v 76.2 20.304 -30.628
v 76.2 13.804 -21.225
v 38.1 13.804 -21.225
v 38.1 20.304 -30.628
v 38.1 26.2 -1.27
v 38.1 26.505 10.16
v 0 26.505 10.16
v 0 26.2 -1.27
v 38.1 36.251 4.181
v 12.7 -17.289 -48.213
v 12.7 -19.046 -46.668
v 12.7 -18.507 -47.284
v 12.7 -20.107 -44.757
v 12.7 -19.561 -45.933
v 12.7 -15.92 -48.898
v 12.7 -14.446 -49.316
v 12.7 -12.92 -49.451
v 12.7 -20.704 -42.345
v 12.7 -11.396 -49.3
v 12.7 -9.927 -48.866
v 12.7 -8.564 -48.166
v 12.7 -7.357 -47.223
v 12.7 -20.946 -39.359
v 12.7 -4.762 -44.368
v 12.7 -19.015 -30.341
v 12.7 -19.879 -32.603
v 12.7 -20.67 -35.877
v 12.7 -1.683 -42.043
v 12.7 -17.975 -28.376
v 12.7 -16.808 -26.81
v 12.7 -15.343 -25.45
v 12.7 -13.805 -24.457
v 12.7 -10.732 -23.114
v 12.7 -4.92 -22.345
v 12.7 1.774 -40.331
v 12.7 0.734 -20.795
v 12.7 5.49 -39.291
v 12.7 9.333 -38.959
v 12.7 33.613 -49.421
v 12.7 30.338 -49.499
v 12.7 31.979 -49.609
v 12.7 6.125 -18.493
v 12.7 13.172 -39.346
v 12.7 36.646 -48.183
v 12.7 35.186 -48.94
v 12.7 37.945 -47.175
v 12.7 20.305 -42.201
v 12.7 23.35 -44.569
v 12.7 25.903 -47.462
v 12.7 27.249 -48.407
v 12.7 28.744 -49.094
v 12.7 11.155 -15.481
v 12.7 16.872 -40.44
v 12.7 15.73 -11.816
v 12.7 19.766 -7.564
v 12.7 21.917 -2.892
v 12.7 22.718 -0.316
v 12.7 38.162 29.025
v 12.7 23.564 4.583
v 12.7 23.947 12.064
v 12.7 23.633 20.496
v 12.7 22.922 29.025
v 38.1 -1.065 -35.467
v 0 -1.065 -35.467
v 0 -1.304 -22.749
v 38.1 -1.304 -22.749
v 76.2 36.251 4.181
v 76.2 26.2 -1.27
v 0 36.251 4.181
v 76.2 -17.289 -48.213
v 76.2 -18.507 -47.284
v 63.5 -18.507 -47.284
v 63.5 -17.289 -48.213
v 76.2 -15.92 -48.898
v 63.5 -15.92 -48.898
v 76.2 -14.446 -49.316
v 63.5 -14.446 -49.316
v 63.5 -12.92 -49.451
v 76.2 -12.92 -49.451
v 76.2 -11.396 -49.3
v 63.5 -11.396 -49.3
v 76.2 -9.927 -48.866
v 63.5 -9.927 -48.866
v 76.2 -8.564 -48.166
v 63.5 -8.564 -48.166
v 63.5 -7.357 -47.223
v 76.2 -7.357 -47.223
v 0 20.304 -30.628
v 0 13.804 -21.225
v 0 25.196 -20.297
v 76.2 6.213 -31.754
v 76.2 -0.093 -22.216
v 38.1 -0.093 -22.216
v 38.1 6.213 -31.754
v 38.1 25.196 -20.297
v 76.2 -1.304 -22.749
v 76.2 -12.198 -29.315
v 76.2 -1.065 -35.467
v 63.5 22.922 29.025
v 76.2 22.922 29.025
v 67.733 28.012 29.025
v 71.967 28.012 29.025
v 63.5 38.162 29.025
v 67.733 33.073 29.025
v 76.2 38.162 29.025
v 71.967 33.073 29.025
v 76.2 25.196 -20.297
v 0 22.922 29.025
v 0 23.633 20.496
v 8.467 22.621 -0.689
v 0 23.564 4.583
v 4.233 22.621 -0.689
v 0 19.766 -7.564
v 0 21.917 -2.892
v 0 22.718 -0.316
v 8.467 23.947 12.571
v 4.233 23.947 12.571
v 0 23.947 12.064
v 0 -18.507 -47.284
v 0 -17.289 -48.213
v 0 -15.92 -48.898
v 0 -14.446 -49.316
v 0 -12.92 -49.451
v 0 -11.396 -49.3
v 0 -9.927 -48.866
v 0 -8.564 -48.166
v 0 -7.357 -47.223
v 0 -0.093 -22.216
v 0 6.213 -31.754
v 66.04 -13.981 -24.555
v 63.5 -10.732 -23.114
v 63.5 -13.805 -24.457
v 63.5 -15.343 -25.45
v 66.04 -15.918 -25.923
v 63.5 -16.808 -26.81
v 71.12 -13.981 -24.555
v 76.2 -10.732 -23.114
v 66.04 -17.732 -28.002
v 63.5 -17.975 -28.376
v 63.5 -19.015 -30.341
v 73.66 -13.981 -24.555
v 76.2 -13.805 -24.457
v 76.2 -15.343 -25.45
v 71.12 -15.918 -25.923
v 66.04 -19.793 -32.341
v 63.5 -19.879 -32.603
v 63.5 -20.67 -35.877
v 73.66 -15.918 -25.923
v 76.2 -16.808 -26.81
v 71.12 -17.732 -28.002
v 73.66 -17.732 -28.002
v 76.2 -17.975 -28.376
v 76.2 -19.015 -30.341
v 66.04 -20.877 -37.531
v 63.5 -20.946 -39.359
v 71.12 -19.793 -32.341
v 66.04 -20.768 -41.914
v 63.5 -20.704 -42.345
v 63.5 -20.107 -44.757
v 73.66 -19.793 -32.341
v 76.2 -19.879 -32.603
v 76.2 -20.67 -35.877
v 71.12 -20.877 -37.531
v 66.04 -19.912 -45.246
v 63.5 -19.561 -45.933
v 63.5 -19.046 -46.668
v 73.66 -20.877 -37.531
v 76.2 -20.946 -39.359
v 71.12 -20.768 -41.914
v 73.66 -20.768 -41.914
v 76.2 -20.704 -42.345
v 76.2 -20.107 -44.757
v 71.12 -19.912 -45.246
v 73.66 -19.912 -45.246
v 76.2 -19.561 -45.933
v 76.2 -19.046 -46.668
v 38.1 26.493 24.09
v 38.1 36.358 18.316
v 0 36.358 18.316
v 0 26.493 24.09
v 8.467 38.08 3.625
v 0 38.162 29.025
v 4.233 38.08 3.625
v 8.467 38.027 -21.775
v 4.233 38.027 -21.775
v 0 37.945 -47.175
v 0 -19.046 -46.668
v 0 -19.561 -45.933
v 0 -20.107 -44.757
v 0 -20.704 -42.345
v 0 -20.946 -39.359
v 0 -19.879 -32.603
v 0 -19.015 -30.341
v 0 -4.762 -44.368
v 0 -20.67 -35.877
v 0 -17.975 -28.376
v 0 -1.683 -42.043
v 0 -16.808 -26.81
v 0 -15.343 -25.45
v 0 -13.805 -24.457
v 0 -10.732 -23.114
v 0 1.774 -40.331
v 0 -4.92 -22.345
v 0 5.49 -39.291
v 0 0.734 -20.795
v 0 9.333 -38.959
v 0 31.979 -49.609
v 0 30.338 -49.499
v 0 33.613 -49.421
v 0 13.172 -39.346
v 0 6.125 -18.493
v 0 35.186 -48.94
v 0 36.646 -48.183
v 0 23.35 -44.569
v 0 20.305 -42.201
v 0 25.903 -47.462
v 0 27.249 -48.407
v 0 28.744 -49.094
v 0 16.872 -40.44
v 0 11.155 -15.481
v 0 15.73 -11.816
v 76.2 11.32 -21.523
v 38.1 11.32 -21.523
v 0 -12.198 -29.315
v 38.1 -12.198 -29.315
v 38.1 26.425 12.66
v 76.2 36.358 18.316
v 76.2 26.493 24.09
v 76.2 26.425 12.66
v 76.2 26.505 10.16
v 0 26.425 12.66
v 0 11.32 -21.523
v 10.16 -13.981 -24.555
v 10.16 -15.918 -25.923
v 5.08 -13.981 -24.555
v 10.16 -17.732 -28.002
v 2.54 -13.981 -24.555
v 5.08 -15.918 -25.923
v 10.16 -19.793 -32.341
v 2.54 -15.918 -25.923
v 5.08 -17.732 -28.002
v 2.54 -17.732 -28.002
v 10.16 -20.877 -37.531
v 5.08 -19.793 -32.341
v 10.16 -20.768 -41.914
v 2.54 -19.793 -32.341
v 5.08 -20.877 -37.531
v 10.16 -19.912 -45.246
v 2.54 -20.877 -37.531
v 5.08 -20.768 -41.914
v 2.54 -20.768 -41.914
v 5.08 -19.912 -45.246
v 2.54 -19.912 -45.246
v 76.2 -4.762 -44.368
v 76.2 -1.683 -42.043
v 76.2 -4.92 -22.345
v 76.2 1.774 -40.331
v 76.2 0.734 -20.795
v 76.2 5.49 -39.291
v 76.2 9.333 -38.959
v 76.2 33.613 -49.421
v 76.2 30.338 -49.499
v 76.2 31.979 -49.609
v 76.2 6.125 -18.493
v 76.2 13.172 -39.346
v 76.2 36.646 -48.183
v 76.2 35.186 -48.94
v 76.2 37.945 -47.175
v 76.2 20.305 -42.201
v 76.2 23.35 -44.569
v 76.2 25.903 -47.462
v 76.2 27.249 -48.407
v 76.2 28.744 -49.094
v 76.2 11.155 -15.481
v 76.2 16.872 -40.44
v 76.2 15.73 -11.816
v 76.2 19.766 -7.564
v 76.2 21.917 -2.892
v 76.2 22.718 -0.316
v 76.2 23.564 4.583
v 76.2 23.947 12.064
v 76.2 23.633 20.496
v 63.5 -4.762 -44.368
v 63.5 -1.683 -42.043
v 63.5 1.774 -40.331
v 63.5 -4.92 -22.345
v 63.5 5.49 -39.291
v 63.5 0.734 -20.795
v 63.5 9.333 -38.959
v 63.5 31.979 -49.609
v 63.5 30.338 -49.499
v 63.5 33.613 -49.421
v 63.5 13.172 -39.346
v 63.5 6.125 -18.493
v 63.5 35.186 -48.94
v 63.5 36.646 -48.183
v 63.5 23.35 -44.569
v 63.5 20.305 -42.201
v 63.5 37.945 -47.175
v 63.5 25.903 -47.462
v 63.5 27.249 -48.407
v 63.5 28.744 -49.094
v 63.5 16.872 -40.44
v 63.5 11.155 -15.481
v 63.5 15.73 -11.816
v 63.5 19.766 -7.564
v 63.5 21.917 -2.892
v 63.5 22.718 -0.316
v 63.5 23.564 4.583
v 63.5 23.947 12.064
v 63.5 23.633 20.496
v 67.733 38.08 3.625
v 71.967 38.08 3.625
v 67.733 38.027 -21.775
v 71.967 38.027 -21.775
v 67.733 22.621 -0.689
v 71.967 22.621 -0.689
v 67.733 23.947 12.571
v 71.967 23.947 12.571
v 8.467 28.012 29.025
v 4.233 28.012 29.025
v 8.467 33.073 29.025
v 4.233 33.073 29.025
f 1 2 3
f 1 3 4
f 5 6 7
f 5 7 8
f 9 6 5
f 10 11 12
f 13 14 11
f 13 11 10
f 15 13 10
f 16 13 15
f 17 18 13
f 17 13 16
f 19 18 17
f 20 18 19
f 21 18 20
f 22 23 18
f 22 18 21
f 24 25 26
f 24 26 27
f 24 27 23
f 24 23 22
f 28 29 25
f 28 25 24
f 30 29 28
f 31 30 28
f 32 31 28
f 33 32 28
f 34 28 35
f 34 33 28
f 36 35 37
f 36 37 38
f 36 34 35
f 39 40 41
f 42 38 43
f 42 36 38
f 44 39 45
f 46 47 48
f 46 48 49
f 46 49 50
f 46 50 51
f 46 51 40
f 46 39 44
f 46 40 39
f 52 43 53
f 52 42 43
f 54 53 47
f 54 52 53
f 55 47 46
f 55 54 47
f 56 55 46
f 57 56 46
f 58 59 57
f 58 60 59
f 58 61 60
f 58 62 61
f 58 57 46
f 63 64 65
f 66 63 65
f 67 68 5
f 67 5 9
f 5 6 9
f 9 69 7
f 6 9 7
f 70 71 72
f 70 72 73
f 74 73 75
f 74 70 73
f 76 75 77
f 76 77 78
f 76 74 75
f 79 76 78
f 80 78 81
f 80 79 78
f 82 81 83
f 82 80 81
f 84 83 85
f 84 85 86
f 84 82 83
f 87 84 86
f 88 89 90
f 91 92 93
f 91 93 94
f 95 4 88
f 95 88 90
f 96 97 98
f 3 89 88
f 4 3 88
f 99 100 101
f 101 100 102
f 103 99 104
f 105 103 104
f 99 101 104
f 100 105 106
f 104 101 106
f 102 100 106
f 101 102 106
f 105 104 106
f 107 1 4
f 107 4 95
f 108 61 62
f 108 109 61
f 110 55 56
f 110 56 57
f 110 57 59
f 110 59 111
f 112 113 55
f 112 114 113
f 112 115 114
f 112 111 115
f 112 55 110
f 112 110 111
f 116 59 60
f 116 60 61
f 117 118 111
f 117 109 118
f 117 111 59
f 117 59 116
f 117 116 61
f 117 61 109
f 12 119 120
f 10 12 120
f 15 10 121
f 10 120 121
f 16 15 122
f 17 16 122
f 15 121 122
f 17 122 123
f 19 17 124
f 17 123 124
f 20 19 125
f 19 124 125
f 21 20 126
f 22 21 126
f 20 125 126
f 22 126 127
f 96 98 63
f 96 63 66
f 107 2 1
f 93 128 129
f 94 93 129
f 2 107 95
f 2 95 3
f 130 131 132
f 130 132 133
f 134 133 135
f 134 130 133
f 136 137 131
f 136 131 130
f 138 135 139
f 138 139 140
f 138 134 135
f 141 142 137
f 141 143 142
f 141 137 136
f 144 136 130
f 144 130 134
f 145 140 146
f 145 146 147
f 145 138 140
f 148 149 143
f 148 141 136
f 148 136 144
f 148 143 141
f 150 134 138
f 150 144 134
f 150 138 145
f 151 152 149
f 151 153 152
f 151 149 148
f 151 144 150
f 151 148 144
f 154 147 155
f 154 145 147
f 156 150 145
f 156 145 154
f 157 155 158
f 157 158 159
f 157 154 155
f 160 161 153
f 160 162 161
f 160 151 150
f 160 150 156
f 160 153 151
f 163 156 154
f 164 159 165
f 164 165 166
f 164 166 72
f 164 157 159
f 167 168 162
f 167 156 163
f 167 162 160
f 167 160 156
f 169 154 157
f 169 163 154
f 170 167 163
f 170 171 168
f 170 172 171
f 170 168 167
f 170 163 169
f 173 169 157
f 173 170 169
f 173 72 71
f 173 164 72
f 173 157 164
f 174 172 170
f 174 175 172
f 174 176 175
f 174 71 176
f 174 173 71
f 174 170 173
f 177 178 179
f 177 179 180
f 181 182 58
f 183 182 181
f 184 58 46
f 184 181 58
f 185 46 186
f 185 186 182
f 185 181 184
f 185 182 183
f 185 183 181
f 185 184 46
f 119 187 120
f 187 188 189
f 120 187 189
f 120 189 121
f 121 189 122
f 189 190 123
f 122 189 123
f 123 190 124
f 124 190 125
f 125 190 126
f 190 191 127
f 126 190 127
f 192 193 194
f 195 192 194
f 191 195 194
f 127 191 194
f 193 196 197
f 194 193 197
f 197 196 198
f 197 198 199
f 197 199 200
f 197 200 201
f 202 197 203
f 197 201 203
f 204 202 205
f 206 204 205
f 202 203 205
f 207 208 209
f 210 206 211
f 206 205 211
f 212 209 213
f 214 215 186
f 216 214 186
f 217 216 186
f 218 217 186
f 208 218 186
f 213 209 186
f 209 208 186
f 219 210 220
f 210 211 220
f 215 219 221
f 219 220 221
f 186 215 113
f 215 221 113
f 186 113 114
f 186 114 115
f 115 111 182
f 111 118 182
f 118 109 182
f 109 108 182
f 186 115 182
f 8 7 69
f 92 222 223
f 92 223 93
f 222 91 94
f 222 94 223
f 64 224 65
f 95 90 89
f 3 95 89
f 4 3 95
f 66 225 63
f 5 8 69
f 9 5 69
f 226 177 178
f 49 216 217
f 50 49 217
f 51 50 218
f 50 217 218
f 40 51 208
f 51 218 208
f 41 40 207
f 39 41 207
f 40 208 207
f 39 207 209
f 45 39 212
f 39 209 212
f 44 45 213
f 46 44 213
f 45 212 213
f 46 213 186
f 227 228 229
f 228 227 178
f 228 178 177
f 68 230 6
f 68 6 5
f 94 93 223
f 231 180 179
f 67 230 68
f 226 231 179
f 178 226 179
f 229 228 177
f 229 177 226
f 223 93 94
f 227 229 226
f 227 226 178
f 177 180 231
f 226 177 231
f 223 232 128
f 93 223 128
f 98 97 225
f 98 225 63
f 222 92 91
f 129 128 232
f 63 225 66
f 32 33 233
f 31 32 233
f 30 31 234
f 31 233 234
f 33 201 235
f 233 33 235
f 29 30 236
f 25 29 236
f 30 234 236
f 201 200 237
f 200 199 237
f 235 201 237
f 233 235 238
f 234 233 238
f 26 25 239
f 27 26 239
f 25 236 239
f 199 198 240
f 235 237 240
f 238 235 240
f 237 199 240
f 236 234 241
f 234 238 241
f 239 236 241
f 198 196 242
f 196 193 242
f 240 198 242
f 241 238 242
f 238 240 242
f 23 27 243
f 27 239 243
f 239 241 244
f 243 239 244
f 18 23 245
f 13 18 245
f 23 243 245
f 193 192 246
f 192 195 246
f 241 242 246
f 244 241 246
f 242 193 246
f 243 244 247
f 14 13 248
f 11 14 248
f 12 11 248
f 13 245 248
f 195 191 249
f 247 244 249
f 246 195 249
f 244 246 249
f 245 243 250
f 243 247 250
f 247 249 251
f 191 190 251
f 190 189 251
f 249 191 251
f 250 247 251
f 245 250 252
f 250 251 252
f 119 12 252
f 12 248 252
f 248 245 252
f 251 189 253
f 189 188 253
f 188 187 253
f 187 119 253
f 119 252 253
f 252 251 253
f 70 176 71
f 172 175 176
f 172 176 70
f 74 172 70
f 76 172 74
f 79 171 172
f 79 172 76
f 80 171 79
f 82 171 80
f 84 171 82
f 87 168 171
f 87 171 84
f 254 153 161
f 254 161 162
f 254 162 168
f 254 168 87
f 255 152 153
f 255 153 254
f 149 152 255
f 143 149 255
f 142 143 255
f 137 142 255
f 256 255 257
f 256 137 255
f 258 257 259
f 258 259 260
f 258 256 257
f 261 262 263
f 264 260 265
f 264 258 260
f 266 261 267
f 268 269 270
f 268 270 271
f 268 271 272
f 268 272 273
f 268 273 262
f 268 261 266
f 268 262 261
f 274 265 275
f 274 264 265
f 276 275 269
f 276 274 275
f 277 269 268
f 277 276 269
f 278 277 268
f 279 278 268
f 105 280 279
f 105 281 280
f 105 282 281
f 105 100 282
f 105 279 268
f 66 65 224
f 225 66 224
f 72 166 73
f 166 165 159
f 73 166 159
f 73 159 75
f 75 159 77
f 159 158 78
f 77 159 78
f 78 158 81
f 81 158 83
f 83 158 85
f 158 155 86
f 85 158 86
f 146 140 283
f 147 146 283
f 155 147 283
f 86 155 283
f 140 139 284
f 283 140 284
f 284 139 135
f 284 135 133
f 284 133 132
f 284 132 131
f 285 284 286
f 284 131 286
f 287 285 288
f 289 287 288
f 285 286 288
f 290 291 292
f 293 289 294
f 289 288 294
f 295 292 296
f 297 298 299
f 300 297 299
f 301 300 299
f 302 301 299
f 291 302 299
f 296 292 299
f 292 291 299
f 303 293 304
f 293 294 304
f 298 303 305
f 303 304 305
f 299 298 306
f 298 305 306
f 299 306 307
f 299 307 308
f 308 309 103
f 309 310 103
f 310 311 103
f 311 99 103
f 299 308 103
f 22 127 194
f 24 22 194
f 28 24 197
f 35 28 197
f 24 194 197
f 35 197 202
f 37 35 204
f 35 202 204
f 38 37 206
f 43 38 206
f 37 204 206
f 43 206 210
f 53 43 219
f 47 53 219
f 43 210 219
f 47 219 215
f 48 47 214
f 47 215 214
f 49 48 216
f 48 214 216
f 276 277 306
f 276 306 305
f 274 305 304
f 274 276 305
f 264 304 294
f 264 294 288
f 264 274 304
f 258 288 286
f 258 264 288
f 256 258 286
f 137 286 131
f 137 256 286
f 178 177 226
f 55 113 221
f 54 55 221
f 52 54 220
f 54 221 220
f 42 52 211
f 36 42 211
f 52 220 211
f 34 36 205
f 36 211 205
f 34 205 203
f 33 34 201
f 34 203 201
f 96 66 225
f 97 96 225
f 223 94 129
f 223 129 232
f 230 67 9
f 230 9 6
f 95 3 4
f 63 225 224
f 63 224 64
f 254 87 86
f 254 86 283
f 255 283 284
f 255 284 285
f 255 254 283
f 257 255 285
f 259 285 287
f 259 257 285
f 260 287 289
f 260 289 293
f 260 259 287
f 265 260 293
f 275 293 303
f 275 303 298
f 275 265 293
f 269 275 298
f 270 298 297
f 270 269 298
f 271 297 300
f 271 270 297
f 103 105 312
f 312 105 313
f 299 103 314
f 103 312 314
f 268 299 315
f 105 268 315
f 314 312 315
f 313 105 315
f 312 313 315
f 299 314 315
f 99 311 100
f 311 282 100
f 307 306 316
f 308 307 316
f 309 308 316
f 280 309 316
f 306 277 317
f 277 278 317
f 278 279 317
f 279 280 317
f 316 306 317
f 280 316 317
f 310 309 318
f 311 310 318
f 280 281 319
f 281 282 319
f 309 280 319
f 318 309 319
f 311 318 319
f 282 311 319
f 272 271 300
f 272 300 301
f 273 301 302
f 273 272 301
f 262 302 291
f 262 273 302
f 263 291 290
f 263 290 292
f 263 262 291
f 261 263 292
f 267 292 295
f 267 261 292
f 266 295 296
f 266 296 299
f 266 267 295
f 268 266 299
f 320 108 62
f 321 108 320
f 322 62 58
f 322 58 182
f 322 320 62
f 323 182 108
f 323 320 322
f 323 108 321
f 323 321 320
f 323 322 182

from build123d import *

# Parameters (mm, degrees)
F3_DEPTH = 38.1
F4_DEPTH = 12.7


with BuildPart() as f3:
    # F1 (on face) → F3 (new body)
    with BuildSketch(Plane.YZ):
        Polygon((26.4932508283, 24.0903730023), (26.4247749001, 12.6603730023), (36.3576832294, 18.3160711089), align=None)
    extrude(amount=F3_DEPTH)


with BuildPart() as f3b:
    # F1 (on face) → F3, piece 2 (new body)
    with BuildSketch(Plane.YZ):
        Polygon((36.2513714214, 4.1811371174), (26.5050424251, 10.1600001085), (26.2003596872, -1.2699998915), align=None)
    extrude(amount=F3_DEPTH)


with BuildPart() as f3c:
    # F2 (on face) → F3, piece 3 (new body)
    with BuildSketch(Plane.YZ):
        Polygon((25.1961359321, -20.2973962285), (13.8036624626, -21.2253710115), (20.3035489335, -30.6275550566), align=None)
    extrude(amount=F3_DEPTH)


with BuildPart() as f3d:
    # F2 (on face) → F3, piece 4 (new body)
    with BuildSketch(Plane.YZ):
        Polygon((6.2131369486, -31.7535884678), (11.3198000183, -21.5232549511), (-0.0932602313, -22.2159217626), align=None)
    extrude(amount=F3_DEPTH)


with BuildPart() as f3e:
    # F2 (on face) → F3, piece 5 (new body)
    with BuildSketch(Plane.YZ):
        Polygon((-1.3037063213, -22.7486744347), (-12.1983075514, -29.3146669865), (-1.0646905855, -35.46667214), align=None)
    extrude(amount=F3_DEPTH)


with BuildPart() as f4:
    # F0 (on Right) → F4 (new body)
    with BuildSketch(Plane.YZ):
        with BuildLine():
            ThreePointArc((-7.3567183398, -47.2232625549), (9.3334213139, -38.9590697867), (25.9034133322, -47.4615993096))
            ThreePointArc((25.9034133322, -47.4615993096), (31.9787992781, -49.6093052248), (37.9450854506, -47.1748885802))
            add(Edge.make_bspline(
                [(38.1623610982, 29.0251114198), (38.0467636502, 3.6251114198), (38.0606828985, -21.7748885802), (37.9450854506, -47.1748885802)],
                knots=[0, 0, 0, 0, 76.2003097678, 76.2003097678, 76.2003097678, 76.2003097678], degree=3))
            add(Edge.make_bspline(
                [(22.9223610982, 29.0251114198), (28.0455333303, 29.0251114198), (33.0391888661, 29.0251114198), (38.1623610982, 29.0251114198)],
                knots=[0, 0, 0, 0, 15.24, 15.24, 15.24, 15.24], degree=3))
            add(Edge.make_bspline(
                [(19.7659601793, -7.5638759529), (20.8297706654, -5.4837352038), (23.3169474769, -0.6203898018), (24.3780430145, 13.0115869391), (23.4244826142, 23.5014217326), (22.9223610982, 29.0251114198)],
                knots=[0, 0, 0, 0, 0.2613564606, 0.6110484311, 1, 1, 1, 1], degree=3))
            ThreePointArc((19.7659601793, -7.5638759529), (6.1250709832, -18.4928822007), (-10.7319852748, -23.1142120897))
            add(Edge.make_bspline(
                [(-10.7319852748, -23.1142120897), (-11.812883555, -23.5272538733), (-14.1877120248, -24.4347429542), (-18.4346007939, -27.7558327017), (-21.6878193154, -37.2574657437), (-20.3743791224, -45.2306316491), (-19.0021176056, -46.7393504707), (-18.5071533432, -47.2835338422)],
                knots=[0, 0, 0, 0, 0.1615304902, 0.3548966761, 0.6263135245, 0.8652141385, 1, 1, 1, 1], degree=3))
            ThreePointArc((-18.5071533432, -47.2835338422), (-12.9200551204, -49.4513802656), (-7.3567183398, -47.2232625549))
        make_face()
    extrude(amount=F4_DEPTH)


with BuildPart() as f5_1:
    # F5: instance of F4
    add(f4.part.mirror(Plane(origin=(38.1, 29.7585696526, 18.3556057045), x_dir=(0, 1, 0), z_dir=(1, 0, 0))))


with BuildPart() as f5_2:
    # F5: instance of F3
    add(f3.part.mirror(Plane(origin=(38.1, 29.7585696526, 18.3556057045), x_dir=(0, 1, 0), z_dir=(1, 0, 0))))


with BuildPart() as f5_3:
    # F5: instance of F3b
    add(f3b.part.mirror(Plane(origin=(38.1, 29.7585696526, 18.3556057045), x_dir=(0, 1, 0), z_dir=(1, 0, 0))))


with BuildPart() as f5_4:
    # F5: instance of F3c
    add(f3c.part.mirror(Plane(origin=(38.1, 29.7585696526, 18.3556057045), x_dir=(0, 1, 0), z_dir=(1, 0, 0))))


with BuildPart() as f5_5:
    # F5: instance of F3d
    add(f3d.part.mirror(Plane(origin=(38.1, 29.7585696526, 18.3556057045), x_dir=(0, 1, 0), z_dir=(1, 0, 0))))


with BuildPart() as f5_6:
    # F5: instance of F3e
    add(f3e.part.mirror(Plane(origin=(38.1, 29.7585696526, 18.3556057045), x_dir=(0, 1, 0), z_dir=(1, 0, 0))))


solid = Compound([f3.part, f3b.part, f3c.part, f3d.part, f3e.part, f4.part, f5_1.part, f5_2.part, f5_3.part, f5_4.part, f5_5.part, f5_6.part])
